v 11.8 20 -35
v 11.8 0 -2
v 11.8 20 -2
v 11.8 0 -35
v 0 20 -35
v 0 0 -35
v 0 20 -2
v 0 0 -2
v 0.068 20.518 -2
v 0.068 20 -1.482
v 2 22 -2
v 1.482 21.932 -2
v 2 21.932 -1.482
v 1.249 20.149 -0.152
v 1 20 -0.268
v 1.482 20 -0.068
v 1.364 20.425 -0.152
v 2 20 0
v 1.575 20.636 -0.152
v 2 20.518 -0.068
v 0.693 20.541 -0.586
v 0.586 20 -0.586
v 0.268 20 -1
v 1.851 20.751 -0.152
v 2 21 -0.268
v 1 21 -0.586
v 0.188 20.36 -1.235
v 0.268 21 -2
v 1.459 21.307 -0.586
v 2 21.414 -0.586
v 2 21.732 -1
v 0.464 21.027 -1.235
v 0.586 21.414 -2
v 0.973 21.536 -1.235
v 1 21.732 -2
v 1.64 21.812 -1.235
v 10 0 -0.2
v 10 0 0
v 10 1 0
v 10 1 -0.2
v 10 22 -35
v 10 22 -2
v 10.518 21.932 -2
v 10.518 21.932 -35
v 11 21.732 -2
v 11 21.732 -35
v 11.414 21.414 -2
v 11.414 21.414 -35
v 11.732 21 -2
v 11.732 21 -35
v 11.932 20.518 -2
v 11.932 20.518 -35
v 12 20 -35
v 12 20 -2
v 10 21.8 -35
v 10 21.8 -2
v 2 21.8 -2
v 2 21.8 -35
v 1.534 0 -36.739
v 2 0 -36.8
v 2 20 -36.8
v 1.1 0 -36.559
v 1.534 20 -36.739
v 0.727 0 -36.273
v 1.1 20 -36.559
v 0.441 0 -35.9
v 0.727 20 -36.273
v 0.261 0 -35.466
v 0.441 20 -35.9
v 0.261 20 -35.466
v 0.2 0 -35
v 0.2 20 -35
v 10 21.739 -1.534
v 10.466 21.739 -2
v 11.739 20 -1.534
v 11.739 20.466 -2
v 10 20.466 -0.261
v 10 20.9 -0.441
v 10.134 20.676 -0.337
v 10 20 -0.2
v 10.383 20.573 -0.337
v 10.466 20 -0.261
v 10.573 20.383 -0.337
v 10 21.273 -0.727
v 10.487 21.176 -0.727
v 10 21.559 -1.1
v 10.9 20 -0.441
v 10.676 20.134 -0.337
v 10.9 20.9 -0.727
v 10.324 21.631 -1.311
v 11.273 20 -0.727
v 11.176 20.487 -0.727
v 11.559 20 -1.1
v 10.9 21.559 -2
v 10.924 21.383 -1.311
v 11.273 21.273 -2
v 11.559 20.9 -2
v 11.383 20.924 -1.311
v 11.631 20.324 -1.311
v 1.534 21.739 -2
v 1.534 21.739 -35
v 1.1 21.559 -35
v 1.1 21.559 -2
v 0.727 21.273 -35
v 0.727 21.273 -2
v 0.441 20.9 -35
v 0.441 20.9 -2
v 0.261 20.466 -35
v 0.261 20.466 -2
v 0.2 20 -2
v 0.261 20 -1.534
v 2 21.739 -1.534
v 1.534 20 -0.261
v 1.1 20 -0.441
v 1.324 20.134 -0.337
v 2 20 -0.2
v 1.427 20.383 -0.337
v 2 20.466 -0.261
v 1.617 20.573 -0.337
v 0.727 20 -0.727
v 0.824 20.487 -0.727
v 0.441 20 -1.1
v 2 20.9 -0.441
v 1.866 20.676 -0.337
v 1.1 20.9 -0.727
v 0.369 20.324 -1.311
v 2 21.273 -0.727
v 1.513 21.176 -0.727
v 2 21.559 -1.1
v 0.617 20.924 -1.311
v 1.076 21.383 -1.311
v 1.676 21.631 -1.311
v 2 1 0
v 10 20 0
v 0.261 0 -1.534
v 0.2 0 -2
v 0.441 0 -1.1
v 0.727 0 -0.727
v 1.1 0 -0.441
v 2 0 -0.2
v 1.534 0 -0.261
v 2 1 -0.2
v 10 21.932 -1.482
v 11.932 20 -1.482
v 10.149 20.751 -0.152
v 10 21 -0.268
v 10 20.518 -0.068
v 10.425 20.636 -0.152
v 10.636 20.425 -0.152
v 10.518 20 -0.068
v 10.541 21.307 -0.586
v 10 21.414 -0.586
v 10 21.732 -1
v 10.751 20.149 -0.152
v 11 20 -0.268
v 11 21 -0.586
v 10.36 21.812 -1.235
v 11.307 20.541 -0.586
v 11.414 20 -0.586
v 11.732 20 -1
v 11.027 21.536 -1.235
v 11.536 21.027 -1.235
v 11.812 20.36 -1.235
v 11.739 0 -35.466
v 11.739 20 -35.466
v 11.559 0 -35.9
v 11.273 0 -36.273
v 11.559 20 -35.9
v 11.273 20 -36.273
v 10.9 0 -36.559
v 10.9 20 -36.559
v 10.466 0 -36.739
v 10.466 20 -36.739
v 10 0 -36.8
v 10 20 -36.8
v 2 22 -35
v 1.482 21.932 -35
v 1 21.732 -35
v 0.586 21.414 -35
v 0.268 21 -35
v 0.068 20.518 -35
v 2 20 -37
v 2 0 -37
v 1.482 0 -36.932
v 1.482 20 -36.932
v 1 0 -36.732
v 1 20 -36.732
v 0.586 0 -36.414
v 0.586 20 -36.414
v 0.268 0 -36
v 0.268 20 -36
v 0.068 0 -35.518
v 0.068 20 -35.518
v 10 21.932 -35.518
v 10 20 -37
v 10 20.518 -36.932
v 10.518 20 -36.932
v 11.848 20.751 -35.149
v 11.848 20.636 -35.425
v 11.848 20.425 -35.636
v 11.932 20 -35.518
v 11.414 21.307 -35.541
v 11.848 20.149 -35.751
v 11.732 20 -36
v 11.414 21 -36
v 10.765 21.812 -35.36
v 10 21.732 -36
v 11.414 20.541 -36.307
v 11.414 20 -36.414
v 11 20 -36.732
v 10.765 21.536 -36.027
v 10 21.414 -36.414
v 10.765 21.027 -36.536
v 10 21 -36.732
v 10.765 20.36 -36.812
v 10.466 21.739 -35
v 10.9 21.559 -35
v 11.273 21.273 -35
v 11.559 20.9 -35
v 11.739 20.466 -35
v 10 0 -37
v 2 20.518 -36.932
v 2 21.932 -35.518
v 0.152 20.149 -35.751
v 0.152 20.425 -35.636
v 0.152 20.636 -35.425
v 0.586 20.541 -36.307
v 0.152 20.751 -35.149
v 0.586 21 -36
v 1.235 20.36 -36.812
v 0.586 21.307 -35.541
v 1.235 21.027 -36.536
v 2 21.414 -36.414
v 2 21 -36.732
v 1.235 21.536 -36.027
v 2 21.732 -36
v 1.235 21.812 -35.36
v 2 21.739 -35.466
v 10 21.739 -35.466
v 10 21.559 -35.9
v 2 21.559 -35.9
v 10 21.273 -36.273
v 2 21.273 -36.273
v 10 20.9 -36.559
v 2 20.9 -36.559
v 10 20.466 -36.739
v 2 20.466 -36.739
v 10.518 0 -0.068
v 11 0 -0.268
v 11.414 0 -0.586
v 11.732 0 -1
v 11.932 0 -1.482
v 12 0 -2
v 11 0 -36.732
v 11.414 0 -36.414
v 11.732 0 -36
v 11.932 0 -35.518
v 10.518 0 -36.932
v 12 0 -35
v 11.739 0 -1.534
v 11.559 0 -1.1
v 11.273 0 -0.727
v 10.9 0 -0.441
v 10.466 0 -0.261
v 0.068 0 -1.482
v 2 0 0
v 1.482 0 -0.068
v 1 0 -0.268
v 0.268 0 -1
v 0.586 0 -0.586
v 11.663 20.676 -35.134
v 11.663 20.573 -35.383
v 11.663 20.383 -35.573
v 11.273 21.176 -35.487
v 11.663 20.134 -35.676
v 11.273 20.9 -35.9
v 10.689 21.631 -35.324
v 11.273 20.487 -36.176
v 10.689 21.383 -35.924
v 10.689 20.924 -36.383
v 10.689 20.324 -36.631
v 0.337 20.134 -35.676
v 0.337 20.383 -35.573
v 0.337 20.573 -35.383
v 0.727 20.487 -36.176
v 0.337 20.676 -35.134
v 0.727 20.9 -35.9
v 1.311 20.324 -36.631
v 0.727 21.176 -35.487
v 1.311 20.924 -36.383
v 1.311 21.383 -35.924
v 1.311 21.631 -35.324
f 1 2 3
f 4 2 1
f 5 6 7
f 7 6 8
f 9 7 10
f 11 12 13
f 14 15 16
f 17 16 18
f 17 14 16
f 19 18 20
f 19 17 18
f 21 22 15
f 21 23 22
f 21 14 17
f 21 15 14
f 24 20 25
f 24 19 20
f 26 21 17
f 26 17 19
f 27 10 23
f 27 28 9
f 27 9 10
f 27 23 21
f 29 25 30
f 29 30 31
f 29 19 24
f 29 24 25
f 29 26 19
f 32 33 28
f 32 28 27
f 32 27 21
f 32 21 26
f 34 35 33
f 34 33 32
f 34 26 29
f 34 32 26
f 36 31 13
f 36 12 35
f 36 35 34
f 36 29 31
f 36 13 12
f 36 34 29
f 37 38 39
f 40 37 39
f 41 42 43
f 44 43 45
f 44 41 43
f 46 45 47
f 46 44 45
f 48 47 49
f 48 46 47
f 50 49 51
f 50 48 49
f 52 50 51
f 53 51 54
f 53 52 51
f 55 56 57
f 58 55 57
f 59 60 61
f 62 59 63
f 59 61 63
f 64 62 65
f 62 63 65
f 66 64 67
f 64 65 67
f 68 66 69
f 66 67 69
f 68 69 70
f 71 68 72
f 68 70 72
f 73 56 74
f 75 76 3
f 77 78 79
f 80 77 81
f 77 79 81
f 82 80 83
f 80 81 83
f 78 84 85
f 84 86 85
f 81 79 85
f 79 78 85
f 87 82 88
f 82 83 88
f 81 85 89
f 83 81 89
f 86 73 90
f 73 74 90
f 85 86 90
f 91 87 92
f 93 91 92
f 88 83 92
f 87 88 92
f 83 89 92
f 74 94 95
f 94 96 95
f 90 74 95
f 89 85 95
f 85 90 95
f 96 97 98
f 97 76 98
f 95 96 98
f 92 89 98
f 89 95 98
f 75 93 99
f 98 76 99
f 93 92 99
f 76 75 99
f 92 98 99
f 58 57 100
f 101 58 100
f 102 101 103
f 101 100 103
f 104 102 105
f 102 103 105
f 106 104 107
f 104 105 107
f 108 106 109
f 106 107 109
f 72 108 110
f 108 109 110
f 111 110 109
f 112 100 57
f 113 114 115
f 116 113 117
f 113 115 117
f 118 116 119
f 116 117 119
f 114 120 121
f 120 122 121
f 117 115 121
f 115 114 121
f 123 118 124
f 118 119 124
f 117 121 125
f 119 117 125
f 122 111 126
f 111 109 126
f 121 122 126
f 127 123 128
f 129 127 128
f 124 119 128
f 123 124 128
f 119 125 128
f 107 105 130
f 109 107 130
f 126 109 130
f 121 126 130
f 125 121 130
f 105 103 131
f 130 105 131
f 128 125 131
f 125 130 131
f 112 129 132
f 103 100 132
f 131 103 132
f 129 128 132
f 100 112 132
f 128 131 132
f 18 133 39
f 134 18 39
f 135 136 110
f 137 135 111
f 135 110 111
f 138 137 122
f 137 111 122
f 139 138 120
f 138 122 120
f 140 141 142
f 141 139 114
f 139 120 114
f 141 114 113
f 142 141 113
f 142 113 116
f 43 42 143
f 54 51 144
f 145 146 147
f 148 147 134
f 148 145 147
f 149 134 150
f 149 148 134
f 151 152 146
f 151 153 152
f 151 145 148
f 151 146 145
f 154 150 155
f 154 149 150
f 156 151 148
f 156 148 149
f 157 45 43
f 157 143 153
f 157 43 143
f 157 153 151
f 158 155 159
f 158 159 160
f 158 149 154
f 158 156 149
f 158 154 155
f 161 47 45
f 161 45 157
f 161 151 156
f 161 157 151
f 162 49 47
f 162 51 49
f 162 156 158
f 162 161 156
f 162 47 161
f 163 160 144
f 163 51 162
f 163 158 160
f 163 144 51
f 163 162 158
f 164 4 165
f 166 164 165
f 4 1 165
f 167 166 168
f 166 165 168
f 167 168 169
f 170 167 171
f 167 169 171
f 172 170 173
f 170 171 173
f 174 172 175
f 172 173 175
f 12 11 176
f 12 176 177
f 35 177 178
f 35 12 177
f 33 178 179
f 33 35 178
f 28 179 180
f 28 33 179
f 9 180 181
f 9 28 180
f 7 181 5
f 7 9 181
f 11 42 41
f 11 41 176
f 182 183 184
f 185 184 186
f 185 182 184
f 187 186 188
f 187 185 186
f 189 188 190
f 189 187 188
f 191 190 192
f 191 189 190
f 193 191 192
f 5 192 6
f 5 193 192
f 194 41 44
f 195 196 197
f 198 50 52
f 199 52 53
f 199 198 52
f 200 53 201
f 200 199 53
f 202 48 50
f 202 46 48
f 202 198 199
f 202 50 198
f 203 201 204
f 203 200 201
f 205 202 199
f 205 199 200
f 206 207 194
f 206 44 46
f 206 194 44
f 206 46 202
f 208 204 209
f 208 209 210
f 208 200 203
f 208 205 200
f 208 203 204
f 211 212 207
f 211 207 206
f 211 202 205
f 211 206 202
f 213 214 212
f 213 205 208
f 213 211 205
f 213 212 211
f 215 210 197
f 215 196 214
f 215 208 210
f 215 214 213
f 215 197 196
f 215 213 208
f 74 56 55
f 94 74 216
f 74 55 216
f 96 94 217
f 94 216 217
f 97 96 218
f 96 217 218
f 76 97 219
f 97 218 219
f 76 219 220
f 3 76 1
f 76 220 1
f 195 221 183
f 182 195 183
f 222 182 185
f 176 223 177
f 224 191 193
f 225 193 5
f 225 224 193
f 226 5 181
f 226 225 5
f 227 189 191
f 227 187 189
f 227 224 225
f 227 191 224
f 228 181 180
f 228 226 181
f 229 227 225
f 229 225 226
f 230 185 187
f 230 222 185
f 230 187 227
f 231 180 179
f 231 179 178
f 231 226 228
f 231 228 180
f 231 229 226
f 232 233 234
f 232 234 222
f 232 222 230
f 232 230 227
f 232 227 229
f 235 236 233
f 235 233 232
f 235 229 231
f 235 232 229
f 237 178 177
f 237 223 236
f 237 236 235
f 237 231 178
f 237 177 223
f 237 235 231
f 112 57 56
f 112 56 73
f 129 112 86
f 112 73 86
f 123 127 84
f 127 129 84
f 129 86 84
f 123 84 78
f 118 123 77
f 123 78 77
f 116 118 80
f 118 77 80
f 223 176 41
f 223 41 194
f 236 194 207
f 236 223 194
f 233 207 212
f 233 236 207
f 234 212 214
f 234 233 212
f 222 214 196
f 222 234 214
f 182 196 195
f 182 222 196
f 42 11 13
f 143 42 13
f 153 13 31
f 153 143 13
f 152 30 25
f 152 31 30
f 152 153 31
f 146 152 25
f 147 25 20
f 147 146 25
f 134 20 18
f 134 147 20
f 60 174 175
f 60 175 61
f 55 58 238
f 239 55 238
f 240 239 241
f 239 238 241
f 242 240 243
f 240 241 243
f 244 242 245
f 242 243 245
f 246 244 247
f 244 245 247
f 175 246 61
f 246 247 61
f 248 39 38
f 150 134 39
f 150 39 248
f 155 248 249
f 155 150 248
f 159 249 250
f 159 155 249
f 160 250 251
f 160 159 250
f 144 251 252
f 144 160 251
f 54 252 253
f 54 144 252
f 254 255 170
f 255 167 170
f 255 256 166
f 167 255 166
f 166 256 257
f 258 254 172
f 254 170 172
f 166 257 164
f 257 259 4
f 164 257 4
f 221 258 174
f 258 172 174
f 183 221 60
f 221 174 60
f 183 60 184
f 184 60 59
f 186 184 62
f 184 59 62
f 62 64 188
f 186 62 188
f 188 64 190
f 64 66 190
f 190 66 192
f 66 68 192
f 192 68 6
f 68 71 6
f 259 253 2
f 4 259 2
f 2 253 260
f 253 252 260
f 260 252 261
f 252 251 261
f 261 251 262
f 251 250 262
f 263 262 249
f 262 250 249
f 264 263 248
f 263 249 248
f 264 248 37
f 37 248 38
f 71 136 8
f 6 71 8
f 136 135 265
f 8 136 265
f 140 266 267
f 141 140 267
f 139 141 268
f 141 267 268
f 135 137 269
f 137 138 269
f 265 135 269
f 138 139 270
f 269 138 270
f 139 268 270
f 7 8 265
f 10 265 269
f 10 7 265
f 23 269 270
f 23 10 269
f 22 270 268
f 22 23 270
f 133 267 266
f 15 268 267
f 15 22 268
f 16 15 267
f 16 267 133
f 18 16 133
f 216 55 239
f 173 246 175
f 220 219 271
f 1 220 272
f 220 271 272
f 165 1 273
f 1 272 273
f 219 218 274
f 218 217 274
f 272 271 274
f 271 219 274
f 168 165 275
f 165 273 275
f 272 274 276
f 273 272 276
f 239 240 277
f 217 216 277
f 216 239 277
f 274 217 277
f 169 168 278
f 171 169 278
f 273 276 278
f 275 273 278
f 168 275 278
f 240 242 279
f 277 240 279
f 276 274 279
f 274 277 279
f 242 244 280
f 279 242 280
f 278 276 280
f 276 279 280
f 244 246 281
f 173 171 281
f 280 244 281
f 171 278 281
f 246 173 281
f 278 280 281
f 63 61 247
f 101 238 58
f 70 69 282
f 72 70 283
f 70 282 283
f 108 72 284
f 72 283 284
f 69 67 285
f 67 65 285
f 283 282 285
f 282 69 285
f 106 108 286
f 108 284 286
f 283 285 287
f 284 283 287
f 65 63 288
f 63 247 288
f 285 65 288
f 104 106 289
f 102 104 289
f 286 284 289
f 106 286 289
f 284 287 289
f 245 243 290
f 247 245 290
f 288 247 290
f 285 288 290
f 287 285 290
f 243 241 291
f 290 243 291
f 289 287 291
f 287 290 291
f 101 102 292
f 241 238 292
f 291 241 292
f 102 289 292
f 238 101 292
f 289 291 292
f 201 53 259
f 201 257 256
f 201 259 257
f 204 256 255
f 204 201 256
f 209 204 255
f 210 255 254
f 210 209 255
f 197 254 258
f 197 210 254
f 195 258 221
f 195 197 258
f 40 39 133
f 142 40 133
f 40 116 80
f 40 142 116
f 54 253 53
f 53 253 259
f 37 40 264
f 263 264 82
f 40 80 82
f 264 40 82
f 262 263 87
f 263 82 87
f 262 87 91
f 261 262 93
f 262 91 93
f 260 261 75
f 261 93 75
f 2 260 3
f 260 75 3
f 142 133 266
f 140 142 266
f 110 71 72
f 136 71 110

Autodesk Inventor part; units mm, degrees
ref_plane "YZ Plane" through (0, 0, 0) normal (1, 0, 0) x (0, 1, 0)
ref_plane "XZ Plane" through (0, 0, 0) normal (0, 1, 0) x (-1, 0, 0)
ref_plane "XY Plane" through (0, 0, 0) normal (0, 0, 1) x (1, 0, 0)
sketch "Sketch1" plane through (0, 0, 0) normal (0, 1, 0) x (-1, 0, 0)
  line L0 (0, 0) -> (-12, 0)
  line L1 (-12, 0) -> (-12, -37)
  line L2 (-12, -37) -> (0, -37)
  line L3 (0, -37) -> (0, 0)
  dimension "d0" = 12
  dimension "d1" = 37
extrude "Extrusion1" add sketch "Sketch1" along normal blind 22
fillet "Fillet1" radius 2 8 edges at (6, 22, -37) (0, 22, -18.5) (12, 22, -18.5) (6, 22, 0) (0, 11, 0) (0, 11, -37) (12, 11, -37) (12, 11, 0)
shell "Shell1" thickness 0.2 removed faces 1 at (8, 0, -13)
sketch "Sketch2" plane through (2, 0, 0) normal (0, 0, 1) x (1, 0, 0)
  line L0 (8, 0) -> (0, 0) projected
  line L1 (8, 0) -> (8, 20) projected
  line L2 (0, 0) -> (8, 0)
  line L3 (8, 0) -> (8, 1)
  line L4 (8, 1) -> (0, 1)
  line L5 (0, 1) -> (0, 0)
  point P0 (-2, 0)
  dimension "d6" = 1
extrude "Extrusion2" cut sketch "Sketch2" against normal blind 22
properties part number "Top_Case"
